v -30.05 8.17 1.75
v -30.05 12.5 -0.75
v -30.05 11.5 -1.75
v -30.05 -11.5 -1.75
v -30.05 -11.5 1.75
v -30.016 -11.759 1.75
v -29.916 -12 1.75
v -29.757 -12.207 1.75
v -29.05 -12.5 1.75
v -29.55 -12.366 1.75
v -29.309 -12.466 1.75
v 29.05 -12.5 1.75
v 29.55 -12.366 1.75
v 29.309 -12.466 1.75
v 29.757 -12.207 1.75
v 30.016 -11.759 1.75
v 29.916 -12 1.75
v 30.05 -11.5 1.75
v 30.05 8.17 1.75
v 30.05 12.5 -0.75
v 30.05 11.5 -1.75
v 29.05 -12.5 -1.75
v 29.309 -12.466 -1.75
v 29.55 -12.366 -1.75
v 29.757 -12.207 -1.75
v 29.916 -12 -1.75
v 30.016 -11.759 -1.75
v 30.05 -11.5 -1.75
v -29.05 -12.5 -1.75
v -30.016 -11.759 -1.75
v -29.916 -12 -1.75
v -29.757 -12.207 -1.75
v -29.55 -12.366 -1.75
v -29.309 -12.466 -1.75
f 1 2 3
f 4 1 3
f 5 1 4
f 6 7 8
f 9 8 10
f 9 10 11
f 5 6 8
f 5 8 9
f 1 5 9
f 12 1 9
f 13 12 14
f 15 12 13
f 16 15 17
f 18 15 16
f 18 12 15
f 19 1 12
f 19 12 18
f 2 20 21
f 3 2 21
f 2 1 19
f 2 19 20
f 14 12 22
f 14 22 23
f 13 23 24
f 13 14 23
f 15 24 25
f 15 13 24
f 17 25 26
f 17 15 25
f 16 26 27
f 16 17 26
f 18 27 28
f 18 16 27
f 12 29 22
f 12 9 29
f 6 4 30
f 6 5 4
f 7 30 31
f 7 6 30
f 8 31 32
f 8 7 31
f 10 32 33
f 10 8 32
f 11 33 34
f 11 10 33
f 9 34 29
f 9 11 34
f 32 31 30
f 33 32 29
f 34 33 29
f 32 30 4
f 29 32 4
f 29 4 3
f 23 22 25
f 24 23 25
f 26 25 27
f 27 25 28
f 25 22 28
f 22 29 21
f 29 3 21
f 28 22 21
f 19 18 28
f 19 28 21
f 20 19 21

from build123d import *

# Parameters (mm, degrees)
F1_DEPTH = 1.75
F3_DEPTH = 100


with BuildPart() as f1:
    # F0 (on Top) → F1 (new body, symmetric)
    with BuildSketch(Plane.XY):
        with BuildLine():
            Line((-29.05, -12.5), (29.05, -12.5))
            ThreePointArc((29.05, -12.5), (29.757107, -12.207107), (30.05, -11.5))
            Line((30.05, -11.5), (30.05, 12.5))
            Line((30.05, 12.5), (-30.05, 12.5))
            Line((-30.05, 12.5), (-30.05, -11.5))
            ThreePointArc((-30.05, -11.5), (-29.757107, -12.207107), (-29.05, -12.5))
        make_face()
    extrude(amount=F1_DEPTH, both=True)

    # F2 (on face) → F3 (cut)
    with BuildSketch(Plane.YZ.offset(30.05)):
        Polygon((12.5, -0.75), (11.5, -1.75), (13.169873, -1.75), (13.169873, 1.75), (8.169873, 1.75), align=None)
    extrude(amount=-F3_DEPTH, mode=Mode.SUBTRACT)


solid = f1.part
